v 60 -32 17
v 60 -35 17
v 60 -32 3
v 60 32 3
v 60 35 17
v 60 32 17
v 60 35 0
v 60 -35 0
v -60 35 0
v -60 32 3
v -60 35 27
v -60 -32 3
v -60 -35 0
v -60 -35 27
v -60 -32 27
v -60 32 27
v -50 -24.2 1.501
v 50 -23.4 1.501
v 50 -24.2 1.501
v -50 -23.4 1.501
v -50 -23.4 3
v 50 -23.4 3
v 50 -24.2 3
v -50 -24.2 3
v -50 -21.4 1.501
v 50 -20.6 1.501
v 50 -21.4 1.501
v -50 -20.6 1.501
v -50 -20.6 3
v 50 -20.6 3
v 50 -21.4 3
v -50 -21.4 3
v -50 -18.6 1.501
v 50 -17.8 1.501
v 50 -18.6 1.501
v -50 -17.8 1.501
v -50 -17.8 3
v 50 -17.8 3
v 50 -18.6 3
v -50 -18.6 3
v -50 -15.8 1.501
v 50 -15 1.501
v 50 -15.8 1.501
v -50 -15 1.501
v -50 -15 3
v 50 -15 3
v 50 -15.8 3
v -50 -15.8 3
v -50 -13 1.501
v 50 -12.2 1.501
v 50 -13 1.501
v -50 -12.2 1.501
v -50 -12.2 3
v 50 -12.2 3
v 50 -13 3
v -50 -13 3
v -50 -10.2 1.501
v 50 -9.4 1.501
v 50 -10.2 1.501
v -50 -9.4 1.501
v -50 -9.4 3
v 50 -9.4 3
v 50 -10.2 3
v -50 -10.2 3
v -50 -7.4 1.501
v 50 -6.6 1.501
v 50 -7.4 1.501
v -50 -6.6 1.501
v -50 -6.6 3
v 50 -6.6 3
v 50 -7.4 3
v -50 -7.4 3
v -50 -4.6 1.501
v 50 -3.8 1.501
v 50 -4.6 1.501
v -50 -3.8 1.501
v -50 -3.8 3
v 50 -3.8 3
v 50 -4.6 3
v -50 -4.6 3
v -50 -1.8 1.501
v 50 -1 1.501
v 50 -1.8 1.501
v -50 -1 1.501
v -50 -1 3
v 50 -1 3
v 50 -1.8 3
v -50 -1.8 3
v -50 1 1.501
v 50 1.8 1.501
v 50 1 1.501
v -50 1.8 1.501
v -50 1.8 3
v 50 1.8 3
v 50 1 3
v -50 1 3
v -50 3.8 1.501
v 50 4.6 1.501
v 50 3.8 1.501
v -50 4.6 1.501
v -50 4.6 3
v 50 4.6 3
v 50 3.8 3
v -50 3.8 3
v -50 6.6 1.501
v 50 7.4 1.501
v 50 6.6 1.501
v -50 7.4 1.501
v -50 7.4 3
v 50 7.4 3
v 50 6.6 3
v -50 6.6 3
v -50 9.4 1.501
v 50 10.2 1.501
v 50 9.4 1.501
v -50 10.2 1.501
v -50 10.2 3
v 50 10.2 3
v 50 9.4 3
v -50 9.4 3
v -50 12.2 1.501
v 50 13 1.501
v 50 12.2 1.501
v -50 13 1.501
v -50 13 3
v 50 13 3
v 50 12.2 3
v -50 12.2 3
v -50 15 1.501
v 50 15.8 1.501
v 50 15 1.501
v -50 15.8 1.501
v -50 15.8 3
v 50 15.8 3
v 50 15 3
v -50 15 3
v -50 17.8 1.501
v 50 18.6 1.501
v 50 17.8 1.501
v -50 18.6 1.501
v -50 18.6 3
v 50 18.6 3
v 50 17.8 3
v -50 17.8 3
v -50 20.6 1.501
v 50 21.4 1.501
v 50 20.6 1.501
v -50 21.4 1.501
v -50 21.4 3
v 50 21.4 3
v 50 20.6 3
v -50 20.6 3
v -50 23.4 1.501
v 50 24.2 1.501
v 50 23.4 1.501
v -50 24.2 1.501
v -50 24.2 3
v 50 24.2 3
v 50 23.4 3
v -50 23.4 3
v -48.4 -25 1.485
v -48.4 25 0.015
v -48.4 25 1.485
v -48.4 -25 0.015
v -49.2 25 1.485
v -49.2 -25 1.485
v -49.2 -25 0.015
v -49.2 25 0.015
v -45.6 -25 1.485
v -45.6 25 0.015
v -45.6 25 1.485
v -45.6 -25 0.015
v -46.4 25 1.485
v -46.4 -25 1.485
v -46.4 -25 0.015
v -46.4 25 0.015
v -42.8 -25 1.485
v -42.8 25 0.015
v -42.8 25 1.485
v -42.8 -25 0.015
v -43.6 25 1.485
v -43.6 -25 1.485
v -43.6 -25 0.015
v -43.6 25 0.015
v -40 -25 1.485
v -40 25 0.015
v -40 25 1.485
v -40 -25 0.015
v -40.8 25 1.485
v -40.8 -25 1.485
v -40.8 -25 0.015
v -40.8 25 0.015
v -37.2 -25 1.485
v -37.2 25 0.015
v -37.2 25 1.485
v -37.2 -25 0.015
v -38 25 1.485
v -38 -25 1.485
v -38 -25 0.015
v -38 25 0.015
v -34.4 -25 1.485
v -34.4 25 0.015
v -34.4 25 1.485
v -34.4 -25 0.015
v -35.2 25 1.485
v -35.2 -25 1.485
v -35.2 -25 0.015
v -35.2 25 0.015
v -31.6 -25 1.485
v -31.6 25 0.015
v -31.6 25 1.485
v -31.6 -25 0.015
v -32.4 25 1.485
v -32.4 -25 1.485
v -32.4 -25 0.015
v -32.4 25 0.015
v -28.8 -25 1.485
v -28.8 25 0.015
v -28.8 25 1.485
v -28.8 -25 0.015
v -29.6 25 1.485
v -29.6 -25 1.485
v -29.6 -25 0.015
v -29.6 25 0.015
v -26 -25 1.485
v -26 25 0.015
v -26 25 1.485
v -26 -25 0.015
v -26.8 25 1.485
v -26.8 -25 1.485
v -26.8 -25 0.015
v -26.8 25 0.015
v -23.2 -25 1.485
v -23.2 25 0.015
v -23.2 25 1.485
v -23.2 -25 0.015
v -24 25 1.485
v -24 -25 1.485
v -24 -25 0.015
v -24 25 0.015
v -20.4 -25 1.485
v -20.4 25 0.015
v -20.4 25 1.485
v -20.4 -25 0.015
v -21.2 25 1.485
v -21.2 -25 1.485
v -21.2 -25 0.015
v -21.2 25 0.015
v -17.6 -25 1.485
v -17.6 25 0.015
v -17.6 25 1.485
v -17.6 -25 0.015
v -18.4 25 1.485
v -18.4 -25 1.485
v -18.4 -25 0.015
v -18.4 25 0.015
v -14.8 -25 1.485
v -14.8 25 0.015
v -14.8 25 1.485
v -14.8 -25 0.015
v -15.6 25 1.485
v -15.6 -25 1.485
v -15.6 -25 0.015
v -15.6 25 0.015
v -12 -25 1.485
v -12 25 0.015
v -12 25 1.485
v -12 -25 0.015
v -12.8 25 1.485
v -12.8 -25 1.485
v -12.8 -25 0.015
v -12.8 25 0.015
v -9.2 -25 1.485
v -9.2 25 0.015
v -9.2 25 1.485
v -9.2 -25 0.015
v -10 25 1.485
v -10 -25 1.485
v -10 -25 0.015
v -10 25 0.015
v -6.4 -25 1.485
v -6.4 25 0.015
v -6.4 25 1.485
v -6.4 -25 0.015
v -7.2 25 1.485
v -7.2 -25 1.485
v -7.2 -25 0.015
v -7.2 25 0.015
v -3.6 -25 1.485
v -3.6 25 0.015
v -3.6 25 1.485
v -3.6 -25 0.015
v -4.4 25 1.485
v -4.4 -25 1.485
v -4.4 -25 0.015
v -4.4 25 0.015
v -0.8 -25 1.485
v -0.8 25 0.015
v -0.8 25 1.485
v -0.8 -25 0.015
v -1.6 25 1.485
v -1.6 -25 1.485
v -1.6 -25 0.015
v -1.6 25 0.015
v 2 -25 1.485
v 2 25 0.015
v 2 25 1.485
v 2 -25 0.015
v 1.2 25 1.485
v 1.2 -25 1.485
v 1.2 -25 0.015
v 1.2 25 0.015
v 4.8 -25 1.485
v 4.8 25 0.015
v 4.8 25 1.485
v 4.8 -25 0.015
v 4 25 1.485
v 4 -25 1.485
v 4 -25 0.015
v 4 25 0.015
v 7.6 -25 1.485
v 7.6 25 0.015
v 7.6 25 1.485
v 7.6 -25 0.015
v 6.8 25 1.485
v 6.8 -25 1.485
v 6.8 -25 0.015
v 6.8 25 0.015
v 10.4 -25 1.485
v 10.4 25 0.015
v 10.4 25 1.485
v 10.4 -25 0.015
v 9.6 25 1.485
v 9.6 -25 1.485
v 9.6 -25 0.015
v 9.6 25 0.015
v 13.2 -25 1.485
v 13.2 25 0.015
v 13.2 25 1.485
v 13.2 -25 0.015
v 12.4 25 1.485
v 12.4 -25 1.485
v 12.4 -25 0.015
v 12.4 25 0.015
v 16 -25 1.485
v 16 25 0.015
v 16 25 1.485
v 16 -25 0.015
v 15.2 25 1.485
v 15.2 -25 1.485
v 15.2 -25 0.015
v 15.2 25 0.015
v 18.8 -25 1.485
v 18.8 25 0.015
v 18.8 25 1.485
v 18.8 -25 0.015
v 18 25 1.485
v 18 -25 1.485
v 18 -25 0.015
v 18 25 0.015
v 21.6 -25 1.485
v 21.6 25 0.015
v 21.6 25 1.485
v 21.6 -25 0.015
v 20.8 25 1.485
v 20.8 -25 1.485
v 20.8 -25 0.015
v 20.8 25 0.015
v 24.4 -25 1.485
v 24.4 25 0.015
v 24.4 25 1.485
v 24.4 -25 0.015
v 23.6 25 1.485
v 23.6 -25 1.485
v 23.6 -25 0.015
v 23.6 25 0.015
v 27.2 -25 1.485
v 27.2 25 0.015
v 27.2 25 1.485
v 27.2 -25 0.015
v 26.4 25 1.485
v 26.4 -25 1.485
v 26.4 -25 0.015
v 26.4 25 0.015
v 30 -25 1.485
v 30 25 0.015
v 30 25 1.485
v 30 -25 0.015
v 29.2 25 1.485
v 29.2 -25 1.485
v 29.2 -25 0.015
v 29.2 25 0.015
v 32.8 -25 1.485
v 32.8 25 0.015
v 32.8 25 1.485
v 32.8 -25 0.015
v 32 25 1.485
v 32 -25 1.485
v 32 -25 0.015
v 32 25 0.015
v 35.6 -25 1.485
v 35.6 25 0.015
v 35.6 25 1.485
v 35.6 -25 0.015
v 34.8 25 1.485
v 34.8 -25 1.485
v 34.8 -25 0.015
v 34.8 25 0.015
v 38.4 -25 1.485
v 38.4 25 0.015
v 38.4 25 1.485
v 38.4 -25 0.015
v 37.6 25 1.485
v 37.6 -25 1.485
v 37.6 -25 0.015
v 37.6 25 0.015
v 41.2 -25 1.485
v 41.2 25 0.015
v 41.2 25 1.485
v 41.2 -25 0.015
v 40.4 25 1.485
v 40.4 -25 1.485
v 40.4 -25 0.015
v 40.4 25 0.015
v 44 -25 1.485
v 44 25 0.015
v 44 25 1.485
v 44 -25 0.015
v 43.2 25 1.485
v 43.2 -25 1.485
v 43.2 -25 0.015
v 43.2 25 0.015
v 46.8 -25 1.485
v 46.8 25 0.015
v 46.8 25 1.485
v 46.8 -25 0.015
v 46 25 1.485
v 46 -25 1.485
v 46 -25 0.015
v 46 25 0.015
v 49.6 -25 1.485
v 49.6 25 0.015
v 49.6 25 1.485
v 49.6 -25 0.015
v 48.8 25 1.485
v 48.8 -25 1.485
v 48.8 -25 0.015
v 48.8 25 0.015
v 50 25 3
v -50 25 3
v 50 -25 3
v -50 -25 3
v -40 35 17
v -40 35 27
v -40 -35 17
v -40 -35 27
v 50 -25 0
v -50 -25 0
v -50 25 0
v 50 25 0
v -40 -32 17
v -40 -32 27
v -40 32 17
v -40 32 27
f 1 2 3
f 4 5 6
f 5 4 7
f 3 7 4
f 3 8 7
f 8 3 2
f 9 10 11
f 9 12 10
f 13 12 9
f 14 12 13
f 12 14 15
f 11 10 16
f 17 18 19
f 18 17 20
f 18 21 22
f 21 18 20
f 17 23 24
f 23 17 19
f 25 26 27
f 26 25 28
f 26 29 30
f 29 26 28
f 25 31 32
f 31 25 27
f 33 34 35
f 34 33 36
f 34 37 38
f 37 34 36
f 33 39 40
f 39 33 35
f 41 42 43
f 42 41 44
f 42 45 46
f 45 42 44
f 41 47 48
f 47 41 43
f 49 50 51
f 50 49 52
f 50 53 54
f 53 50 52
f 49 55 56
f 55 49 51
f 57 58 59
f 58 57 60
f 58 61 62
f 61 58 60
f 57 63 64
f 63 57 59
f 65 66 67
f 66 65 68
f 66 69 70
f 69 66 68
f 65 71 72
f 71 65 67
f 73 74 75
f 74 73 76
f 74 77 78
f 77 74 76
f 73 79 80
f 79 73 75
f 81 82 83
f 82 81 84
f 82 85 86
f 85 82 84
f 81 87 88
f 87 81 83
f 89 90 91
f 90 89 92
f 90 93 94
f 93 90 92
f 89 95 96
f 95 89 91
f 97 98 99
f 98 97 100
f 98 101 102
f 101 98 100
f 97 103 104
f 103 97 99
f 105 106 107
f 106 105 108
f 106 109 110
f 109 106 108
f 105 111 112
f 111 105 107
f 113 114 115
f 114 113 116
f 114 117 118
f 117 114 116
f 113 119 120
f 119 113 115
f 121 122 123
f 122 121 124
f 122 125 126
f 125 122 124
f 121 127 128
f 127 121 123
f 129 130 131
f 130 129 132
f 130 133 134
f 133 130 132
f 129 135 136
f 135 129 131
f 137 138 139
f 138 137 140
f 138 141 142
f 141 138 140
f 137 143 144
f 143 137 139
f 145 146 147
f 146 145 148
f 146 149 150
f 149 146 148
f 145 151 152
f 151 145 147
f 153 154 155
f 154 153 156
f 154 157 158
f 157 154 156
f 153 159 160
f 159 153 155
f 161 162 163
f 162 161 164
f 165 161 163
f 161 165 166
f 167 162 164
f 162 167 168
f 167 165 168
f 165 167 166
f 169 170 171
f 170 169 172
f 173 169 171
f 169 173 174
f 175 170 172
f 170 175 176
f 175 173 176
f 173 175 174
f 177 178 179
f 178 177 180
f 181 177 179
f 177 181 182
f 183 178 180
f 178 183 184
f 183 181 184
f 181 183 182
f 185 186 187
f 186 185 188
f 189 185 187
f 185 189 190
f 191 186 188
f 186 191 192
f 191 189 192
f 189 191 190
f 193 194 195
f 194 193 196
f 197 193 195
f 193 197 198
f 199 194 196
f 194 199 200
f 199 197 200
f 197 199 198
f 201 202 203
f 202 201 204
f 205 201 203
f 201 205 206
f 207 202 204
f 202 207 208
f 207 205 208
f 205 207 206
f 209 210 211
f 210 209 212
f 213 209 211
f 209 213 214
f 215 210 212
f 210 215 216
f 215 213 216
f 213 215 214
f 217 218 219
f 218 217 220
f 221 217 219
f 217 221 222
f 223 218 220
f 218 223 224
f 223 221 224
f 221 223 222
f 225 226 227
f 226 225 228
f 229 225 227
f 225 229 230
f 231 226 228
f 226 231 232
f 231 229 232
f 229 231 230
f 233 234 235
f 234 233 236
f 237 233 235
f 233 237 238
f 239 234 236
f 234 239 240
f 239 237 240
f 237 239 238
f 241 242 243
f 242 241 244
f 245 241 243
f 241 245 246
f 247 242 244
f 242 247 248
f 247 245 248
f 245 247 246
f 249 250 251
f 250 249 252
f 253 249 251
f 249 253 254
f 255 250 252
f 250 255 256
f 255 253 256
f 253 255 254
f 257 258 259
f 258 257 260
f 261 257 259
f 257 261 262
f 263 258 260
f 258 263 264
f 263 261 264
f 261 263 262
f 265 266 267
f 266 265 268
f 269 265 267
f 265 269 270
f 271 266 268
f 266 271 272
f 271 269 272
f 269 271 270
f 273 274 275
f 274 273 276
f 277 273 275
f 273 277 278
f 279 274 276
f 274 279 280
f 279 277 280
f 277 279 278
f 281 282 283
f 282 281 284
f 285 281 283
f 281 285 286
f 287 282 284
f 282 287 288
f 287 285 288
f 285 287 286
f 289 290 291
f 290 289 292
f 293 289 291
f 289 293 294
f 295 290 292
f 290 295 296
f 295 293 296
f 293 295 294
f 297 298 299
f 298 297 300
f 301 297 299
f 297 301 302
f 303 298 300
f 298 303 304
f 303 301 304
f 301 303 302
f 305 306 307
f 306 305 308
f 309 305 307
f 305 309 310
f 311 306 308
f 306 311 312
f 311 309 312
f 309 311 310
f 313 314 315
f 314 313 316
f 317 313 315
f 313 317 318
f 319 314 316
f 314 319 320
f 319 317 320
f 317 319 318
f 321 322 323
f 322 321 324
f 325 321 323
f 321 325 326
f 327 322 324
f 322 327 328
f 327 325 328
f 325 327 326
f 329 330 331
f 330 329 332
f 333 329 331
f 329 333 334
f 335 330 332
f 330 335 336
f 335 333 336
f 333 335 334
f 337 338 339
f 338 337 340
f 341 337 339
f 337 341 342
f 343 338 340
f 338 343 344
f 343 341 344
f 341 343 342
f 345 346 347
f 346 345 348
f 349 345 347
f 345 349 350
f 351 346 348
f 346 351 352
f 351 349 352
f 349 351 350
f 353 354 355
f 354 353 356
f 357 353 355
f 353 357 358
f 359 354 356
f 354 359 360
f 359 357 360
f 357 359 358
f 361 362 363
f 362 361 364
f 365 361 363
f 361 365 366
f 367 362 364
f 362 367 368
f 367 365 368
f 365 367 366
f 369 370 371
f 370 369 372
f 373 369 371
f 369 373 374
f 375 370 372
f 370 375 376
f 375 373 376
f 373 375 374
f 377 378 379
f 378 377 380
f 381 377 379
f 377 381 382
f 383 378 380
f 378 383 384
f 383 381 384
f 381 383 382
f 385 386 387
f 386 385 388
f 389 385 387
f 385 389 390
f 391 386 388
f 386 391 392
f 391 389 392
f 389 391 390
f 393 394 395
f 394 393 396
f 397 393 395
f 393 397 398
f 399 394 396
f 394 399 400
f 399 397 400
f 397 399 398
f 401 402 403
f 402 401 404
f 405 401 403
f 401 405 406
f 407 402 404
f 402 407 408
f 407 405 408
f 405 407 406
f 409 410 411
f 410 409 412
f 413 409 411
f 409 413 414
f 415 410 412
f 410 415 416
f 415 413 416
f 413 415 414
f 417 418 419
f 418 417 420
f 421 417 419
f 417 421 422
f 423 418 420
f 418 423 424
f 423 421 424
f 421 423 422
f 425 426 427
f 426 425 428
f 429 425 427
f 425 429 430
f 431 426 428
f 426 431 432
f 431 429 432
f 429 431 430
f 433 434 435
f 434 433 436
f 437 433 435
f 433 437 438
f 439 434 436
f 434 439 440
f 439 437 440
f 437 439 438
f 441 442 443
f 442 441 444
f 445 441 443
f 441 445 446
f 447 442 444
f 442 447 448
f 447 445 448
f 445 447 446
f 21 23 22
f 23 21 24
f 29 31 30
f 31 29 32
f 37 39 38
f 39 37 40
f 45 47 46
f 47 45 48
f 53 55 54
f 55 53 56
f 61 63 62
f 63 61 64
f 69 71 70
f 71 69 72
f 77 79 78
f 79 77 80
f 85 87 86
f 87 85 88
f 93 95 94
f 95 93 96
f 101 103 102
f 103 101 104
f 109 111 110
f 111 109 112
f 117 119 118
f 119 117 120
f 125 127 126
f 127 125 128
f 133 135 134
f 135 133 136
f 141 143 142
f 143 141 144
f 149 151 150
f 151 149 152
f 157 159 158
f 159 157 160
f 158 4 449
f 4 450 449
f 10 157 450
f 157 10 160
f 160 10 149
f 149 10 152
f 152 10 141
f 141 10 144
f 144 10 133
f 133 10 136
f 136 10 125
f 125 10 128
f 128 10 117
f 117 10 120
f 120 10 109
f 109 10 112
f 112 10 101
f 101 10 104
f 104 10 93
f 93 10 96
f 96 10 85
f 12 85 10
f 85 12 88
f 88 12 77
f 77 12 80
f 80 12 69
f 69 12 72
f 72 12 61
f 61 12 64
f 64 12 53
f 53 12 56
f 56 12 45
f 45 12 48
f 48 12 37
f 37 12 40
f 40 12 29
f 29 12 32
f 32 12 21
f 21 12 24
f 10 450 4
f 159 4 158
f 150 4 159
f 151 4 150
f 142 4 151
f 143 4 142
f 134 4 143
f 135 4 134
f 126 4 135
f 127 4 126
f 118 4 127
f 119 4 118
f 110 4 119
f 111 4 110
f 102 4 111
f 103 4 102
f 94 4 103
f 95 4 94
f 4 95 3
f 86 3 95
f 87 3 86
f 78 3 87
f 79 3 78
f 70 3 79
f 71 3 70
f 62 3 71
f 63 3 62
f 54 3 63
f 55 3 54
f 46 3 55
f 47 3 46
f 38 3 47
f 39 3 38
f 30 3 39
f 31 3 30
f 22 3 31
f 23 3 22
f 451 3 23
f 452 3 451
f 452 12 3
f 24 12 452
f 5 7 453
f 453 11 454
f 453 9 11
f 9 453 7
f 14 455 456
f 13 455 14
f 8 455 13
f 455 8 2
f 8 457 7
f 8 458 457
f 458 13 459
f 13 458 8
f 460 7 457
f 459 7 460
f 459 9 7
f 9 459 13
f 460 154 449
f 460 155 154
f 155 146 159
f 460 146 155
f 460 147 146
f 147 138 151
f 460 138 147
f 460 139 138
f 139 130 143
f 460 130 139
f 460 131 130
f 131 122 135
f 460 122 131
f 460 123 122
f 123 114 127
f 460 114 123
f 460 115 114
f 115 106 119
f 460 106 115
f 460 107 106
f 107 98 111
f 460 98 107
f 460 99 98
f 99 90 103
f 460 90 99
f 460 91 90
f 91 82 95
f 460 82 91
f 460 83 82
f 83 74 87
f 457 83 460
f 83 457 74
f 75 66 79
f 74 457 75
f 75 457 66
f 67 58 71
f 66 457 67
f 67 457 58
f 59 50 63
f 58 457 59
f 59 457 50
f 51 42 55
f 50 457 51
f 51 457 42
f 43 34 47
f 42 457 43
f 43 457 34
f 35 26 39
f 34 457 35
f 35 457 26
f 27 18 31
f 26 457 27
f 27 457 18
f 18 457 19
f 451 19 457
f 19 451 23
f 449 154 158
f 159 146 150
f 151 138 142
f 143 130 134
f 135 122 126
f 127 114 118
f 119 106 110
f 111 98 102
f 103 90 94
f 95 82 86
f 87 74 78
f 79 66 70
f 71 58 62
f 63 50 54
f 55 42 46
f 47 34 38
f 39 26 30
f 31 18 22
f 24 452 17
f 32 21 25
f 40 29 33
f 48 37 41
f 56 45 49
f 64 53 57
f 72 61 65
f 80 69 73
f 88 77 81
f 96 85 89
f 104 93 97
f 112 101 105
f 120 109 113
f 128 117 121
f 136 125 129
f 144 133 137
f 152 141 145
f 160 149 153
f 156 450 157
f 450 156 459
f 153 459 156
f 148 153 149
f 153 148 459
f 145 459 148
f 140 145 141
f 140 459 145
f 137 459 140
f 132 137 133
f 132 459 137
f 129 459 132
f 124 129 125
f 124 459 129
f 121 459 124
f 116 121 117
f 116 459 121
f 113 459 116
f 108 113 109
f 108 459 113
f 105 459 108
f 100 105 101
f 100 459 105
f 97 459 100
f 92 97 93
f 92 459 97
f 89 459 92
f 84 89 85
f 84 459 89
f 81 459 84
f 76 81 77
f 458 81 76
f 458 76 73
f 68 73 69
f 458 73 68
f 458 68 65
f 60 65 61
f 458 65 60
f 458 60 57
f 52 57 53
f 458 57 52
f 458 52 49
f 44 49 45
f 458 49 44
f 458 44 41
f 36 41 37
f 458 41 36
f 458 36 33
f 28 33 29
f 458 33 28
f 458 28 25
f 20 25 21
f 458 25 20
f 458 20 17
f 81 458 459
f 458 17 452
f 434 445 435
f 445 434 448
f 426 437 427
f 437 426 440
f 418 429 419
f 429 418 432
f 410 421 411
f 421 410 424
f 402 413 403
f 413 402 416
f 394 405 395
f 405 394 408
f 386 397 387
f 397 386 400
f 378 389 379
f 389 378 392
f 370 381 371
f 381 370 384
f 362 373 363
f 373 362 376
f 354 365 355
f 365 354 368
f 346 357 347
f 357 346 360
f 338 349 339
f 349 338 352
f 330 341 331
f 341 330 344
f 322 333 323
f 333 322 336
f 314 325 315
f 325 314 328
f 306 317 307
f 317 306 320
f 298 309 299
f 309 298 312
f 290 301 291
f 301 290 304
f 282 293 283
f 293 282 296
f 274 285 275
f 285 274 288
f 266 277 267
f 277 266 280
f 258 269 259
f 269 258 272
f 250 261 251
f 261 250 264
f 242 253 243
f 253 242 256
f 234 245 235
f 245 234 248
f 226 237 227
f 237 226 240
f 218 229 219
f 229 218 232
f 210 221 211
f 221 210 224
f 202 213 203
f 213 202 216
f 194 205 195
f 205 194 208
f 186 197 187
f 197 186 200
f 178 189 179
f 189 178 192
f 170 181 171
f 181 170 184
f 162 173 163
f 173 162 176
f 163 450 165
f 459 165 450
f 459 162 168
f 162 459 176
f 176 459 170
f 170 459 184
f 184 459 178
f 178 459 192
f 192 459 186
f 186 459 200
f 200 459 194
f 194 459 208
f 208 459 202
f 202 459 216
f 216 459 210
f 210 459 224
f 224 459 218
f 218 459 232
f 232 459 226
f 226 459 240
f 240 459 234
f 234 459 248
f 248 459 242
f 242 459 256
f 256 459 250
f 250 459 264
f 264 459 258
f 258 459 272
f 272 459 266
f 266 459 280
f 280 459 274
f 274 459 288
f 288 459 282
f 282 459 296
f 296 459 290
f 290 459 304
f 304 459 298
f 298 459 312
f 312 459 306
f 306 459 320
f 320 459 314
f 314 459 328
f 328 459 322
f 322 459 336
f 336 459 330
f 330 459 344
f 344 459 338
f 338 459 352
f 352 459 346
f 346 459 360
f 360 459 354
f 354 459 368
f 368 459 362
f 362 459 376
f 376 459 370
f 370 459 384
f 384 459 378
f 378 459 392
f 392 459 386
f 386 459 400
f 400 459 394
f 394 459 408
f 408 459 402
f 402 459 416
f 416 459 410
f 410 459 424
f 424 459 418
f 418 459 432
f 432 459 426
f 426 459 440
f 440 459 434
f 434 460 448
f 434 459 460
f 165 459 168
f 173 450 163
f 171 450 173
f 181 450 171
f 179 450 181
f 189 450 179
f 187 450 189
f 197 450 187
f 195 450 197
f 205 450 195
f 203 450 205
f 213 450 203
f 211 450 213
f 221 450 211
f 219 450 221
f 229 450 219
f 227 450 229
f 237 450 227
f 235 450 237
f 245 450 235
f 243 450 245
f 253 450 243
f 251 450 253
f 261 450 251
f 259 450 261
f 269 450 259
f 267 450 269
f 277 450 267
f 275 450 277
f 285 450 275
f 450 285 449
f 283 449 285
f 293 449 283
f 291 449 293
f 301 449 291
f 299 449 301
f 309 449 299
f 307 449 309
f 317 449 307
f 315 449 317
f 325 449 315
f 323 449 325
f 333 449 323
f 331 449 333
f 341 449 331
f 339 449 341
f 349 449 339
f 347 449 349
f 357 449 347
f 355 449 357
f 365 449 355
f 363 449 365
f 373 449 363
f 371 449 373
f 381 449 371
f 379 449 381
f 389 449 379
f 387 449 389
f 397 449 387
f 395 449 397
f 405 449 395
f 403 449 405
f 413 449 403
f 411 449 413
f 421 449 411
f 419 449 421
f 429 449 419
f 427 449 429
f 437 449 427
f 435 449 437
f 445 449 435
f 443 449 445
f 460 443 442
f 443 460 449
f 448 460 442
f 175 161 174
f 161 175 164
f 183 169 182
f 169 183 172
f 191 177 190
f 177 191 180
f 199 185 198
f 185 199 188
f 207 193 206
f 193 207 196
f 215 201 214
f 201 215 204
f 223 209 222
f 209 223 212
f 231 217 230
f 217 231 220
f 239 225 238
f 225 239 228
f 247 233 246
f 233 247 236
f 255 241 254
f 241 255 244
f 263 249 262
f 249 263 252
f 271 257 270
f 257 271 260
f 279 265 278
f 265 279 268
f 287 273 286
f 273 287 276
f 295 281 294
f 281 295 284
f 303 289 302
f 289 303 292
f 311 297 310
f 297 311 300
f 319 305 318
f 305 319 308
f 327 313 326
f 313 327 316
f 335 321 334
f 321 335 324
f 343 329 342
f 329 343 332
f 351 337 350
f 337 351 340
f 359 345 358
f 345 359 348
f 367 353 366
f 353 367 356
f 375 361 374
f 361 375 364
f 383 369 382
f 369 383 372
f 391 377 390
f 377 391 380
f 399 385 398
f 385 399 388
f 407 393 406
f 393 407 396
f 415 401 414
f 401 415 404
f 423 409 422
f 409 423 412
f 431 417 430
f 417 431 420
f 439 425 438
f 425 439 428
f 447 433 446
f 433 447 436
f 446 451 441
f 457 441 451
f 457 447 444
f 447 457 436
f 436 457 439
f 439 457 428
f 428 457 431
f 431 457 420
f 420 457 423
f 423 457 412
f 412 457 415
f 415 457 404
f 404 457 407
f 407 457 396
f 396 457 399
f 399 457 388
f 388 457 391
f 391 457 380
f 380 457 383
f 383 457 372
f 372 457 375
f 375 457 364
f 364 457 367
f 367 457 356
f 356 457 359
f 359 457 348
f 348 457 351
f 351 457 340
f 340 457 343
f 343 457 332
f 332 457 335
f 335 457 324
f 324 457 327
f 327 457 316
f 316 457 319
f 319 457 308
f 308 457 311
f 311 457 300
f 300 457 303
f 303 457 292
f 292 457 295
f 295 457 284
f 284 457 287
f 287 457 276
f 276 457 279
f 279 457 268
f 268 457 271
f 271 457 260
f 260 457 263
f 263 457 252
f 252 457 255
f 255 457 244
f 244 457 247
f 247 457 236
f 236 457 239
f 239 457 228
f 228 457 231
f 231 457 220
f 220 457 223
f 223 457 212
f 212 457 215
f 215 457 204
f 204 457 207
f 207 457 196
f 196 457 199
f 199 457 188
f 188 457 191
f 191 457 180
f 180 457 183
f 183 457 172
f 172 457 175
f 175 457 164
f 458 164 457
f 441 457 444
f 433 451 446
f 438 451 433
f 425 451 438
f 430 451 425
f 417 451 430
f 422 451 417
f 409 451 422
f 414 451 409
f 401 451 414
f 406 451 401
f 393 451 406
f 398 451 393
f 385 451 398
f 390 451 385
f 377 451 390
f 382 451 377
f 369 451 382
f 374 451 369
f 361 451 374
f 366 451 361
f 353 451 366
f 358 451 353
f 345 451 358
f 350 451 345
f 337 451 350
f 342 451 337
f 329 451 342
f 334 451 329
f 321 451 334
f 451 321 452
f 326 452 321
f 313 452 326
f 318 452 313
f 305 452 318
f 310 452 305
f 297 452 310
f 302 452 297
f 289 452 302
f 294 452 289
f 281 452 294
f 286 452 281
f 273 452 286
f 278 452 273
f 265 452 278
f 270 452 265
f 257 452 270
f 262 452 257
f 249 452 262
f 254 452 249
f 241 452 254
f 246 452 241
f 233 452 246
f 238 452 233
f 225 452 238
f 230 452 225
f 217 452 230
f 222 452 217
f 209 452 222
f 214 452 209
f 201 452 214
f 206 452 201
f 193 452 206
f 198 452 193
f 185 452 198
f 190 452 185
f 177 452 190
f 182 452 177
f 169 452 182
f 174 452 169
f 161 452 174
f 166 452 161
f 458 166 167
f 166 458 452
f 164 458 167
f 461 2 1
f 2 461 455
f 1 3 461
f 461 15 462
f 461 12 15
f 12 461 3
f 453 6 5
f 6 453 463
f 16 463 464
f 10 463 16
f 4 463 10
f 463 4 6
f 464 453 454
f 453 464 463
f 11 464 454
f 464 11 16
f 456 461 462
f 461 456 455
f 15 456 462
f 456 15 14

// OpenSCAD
// Fine mesh screen (Now with rectangles!!)
// by churusaa 2020 (https://www.thingiverse.com/churusaa)
// Licensed under Creative Commons - GNU GPL License
// More detail at:
// http://www.thingiverse.com/thing:4396258

// Remixed from Wauter's Fine mesh screen object
// https://www.thingiverse.com/thing:27805 
// When printing a very fine mesh pattern, the slicer will slice the mesh into little
// squares instead of long threads. This mesh screen fixes that by separating the perpendicular threads 
// with a tiny gap. your slicer will close the gap when slicing, but will recognize the
// threads as lines and not as little squares.

  //////////////////////////
 // Customizer Settings: //
//////////////////////////

//Generate a circle, a square, or a rectangle:
generateShape = "rectangle"; // [circle,square,rectangle]

//Diameter of the circle, or side of the square:
meshscreen_d = 70;

//Length of the rectangle (used by meshscreen_rectangle):
meshscreen_l = 120;

//Width of the solid border around the mesh:
meshscreen_borderwidth = 10;

//Thickness of the screen. should be a multiple of you layer height for best results:
meshscreen_h = 3; 

//Print layer height:
layer_h = 1;

//Meshthread width. Please keep this a multiple of the width of the thread of //your printer. Use multiple shells in your slicing settings if necessary:
meshthread_w = 0.8;

//Spacing in between mesh threads:
mesh_space = 2;

module GoAwayCustomizer() {
// This module is here to stop Customizer from picking up the variables below
}

generateSquare = "square";
generateCircle = "circle";
generateRectangle = "rectangle";


module mesh_raw(h=2,mesh_w=1,mesh_l=1,mesh_space=2,width=50,length=50,layer_h=0.3){
	for ( j = [0 :(mesh_w+mesh_space): width] )
	{
		translate([0,0,h/2+0.001])translate([0, -width/2+j, h/4])cube([length,mesh_w,h/2],center=true);
	}
    for ( j = [0 :(mesh_w+mesh_space): length] )
    {
        translate([0,0,0])translate([-length/2+j, 0, h/4])cube([mesh_w,length,h/2-layer_h/10],center=true);
    }

}

module meshscreen_circle(h=2,border_w=meshscreen_borderwidth,mesh_w=1,mesh_space=2,width=60,length=60,layer_h=0.3){
	intersection(){
		cylinder(r=width/2,h);
		mesh_raw(h=h,mesh_w=mesh_w,mesh_space=mesh_space,width=width,length=length,layer_h=0.3);
	}
	difference(){
		cylinder(r=width/2,h);
		translate([0,0,-h*0.05])cylinder(r=width/2-border_w,h=h*1.1);
	}
}

module meshscreen_square(h=2,border_w=meshscreen_borderwidth,mesh_w=1,mesh_space=2,width=60,length=60,layer_h=0.3){
	intersection(){
		translate([0,0,h/2])cube([width,width,h],center=true);
		mesh_raw(h=h,mesh_w=mesh_w,mesh_space=mesh_space,width=width,length=length,layer_h=0.3);
	}
	difference(){
		translate([0,0,h/2])cube([width,width,h],center=true);	translate([0,0,h/2])cube([width-border_w*2,width-border_w*2,h*1.1],center=true);
	}
}

module meshscreen_rectangle(h=2,border_w=meshscreen_borderwidth,mesh_w=1,mesh_space=2,width=60,length=60,layer_h=0.3){
	intersection(){
		translate([0,0,h/2])cube([length,width,h],center=true);
		mesh_raw(h=h,mesh_w=mesh_w,mesh_space=mesh_space,width=width,length=length,layer_h=0.3);
	}
	difference(){
		translate([0,0,h/2])cube([length,width,h],center=true);	translate([0,0,h/2])cube([length-border_w*2,width-border_w*2,h*1.1],center=true);
	}
}

if (generateShape == generateCircle) {
	meshscreen_circle(h=meshscreen_h,border_w=meshscreen_borderwidth,mesh_w=meshthread_w,mesh_space=mesh_space,width=meshscreen_d,length=meshscreen_d,layer_h=layer_h);
}
else if (generateShape == generateRectangle) {
	meshscreen_rectangle(h=meshscreen_h,border_w=meshscreen_borderwidth,mesh_w=meshthread_w,mesh_space=mesh_space,width=meshscreen_d,length=meshscreen_l,layer_h=layer_h);
}
else if (generateShape == generateSquare) {
	meshscreen_square(h=meshscreen_h,border_w=meshscreen_borderwidth,mesh_w=meshthread_w,mesh_space=mesh_space,width=meshscreen_d,length=meshscreen_d,layer_h=layer_h);
}
else {
	sphere(10);
    translate([15, 15, 15]) {
        text("Something went very oops.", font = "Liberation Sans");
    }
}

translate([-60,-35,2]) {
    cube([120,3,15]);
}

translate([-60,32,2]) {
    cube([120,3,15]);
}

translate([-60,32,2]) {
    cube([20,3,25]);
}

translate([-60,-35,2]) {
    cube([20,3,25]);
}
